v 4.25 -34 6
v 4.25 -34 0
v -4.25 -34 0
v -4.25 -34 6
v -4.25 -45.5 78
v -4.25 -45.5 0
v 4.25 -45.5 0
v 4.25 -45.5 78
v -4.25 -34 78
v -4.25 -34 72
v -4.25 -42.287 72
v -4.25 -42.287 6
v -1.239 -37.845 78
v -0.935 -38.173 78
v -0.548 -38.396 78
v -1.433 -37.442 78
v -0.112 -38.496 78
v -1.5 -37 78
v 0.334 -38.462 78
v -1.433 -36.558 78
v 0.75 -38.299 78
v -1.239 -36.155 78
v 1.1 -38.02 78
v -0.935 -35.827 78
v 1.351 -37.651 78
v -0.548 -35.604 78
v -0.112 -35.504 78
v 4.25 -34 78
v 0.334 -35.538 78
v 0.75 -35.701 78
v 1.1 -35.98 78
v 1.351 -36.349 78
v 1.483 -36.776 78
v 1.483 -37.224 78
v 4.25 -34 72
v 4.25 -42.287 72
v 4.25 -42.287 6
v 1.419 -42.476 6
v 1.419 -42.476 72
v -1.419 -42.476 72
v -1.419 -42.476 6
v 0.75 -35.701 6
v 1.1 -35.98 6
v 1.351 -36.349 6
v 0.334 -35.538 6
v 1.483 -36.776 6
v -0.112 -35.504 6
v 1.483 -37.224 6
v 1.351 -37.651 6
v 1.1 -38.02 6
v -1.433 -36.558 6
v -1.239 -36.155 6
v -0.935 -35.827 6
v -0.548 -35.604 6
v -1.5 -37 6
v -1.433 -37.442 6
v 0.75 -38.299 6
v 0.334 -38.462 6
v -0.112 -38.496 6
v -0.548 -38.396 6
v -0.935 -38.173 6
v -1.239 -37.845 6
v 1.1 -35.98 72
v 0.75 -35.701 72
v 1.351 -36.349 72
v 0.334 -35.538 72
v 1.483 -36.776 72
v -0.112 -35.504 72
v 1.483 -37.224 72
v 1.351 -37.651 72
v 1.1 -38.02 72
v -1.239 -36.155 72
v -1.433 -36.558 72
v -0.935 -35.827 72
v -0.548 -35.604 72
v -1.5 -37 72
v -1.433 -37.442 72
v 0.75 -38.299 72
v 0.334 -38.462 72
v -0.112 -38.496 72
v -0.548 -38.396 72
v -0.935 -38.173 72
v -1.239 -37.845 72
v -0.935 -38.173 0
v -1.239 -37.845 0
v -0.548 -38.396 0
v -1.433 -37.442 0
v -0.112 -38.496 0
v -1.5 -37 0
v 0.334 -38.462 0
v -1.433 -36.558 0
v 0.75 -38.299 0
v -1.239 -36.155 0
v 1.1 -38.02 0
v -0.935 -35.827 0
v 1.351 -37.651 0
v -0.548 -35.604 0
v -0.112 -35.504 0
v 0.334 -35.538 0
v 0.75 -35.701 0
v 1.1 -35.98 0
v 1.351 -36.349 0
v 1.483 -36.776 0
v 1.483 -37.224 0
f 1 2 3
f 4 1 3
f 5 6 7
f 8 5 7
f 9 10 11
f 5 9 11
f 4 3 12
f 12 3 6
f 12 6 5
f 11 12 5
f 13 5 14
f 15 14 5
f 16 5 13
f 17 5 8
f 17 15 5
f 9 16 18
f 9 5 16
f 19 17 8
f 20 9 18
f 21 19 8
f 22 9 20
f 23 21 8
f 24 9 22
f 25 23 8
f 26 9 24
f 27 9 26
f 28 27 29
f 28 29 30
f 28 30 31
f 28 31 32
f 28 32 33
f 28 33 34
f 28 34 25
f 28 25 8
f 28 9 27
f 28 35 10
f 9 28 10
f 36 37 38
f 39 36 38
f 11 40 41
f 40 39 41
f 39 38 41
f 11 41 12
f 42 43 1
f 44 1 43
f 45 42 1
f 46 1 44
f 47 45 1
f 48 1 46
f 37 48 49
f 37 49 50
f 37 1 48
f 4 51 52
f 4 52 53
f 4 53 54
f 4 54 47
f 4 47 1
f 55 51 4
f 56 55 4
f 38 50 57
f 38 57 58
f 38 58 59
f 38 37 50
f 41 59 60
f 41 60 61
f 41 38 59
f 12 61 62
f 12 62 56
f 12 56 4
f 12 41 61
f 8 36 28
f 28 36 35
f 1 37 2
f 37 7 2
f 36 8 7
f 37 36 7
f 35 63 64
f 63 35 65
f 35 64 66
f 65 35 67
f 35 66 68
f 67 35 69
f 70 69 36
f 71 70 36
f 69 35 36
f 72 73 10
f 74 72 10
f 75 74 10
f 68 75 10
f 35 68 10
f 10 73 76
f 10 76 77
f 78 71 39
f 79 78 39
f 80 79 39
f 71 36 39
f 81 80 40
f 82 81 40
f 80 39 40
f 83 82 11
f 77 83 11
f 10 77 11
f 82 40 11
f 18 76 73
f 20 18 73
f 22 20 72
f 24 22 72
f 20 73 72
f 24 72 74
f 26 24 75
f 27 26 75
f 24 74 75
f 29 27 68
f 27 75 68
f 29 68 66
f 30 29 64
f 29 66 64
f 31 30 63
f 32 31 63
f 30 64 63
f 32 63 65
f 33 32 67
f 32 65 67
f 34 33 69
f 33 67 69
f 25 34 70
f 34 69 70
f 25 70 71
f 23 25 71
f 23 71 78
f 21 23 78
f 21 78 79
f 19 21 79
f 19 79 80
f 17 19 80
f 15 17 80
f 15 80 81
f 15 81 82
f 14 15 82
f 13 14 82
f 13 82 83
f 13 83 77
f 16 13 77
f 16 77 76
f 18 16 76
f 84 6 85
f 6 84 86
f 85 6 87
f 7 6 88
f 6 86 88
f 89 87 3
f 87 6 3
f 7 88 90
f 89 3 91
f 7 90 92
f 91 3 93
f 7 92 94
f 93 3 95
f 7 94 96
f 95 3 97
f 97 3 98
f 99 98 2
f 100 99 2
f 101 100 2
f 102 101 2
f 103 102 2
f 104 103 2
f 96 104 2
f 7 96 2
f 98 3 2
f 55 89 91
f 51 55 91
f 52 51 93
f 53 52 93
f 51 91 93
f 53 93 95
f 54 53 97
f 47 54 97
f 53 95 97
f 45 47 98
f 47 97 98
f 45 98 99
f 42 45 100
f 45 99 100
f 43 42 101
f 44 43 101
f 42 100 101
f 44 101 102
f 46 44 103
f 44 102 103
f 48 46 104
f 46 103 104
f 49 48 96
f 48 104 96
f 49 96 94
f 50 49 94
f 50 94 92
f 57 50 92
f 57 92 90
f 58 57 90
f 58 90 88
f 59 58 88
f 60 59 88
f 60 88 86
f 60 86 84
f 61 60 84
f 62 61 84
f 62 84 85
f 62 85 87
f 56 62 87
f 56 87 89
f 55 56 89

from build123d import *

# Parameters (mm, degrees)
BOSS_EXTRUDE1_DEPTH = 78
SKETCH2_W           = 8.5
SKETCH2_H           = 6
BOSS_EXTRUDE2_DEPTH = 8.5
SKETCH3_R           = 1.5
CUT_EXTRUDE1_DEPTH  = 100


with BuildPart() as part:
    # Sketch1 → Boss-Extrude1 (new body)
    with BuildSketch(Plane.XY):
        with BuildLine():
            Line((-4.25, -45.5), (4.25, -45.5))
            Line((4.25, -45.5), (4.25, -42.286966077))
            ThreePointArc((4.25, -42.286966077), (0, -42.5), (-4.25, -42.286966077))
            Line((-4.25, -42.286966077), (-4.25, -45.5))
        make_face()
    extrude(amount=BOSS_EXTRUDE1_DEPTH)

    # Sketch2 → Boss-Extrude2 (add)
    with BuildSketch(Plane(origin=(0, -42.5, 0), x_dir=(-1, 0, 0), z_dir=(0, -1, 0))):
        with Locations((0, -75)):
            Rectangle(SKETCH2_W, SKETCH2_H)
        with Locations((0, -3)):
            Rectangle(SKETCH2_W, SKETCH2_H)
    extrude(amount=-BOSS_EXTRUDE2_DEPTH)

    # Sketch3 → Cut-Extrude1 (cut)
    with BuildSketch(Plane(origin=(0, 0, 0), x_dir=(-1, 0, 0), z_dir=(0, 0, -1))):
        with Locations((0, -37)):
            Circle(SKETCH3_R)
    extrude(amount=-CUT_EXTRUDE1_DEPTH, mode=Mode.SUBTRACT)


solid = part.part
